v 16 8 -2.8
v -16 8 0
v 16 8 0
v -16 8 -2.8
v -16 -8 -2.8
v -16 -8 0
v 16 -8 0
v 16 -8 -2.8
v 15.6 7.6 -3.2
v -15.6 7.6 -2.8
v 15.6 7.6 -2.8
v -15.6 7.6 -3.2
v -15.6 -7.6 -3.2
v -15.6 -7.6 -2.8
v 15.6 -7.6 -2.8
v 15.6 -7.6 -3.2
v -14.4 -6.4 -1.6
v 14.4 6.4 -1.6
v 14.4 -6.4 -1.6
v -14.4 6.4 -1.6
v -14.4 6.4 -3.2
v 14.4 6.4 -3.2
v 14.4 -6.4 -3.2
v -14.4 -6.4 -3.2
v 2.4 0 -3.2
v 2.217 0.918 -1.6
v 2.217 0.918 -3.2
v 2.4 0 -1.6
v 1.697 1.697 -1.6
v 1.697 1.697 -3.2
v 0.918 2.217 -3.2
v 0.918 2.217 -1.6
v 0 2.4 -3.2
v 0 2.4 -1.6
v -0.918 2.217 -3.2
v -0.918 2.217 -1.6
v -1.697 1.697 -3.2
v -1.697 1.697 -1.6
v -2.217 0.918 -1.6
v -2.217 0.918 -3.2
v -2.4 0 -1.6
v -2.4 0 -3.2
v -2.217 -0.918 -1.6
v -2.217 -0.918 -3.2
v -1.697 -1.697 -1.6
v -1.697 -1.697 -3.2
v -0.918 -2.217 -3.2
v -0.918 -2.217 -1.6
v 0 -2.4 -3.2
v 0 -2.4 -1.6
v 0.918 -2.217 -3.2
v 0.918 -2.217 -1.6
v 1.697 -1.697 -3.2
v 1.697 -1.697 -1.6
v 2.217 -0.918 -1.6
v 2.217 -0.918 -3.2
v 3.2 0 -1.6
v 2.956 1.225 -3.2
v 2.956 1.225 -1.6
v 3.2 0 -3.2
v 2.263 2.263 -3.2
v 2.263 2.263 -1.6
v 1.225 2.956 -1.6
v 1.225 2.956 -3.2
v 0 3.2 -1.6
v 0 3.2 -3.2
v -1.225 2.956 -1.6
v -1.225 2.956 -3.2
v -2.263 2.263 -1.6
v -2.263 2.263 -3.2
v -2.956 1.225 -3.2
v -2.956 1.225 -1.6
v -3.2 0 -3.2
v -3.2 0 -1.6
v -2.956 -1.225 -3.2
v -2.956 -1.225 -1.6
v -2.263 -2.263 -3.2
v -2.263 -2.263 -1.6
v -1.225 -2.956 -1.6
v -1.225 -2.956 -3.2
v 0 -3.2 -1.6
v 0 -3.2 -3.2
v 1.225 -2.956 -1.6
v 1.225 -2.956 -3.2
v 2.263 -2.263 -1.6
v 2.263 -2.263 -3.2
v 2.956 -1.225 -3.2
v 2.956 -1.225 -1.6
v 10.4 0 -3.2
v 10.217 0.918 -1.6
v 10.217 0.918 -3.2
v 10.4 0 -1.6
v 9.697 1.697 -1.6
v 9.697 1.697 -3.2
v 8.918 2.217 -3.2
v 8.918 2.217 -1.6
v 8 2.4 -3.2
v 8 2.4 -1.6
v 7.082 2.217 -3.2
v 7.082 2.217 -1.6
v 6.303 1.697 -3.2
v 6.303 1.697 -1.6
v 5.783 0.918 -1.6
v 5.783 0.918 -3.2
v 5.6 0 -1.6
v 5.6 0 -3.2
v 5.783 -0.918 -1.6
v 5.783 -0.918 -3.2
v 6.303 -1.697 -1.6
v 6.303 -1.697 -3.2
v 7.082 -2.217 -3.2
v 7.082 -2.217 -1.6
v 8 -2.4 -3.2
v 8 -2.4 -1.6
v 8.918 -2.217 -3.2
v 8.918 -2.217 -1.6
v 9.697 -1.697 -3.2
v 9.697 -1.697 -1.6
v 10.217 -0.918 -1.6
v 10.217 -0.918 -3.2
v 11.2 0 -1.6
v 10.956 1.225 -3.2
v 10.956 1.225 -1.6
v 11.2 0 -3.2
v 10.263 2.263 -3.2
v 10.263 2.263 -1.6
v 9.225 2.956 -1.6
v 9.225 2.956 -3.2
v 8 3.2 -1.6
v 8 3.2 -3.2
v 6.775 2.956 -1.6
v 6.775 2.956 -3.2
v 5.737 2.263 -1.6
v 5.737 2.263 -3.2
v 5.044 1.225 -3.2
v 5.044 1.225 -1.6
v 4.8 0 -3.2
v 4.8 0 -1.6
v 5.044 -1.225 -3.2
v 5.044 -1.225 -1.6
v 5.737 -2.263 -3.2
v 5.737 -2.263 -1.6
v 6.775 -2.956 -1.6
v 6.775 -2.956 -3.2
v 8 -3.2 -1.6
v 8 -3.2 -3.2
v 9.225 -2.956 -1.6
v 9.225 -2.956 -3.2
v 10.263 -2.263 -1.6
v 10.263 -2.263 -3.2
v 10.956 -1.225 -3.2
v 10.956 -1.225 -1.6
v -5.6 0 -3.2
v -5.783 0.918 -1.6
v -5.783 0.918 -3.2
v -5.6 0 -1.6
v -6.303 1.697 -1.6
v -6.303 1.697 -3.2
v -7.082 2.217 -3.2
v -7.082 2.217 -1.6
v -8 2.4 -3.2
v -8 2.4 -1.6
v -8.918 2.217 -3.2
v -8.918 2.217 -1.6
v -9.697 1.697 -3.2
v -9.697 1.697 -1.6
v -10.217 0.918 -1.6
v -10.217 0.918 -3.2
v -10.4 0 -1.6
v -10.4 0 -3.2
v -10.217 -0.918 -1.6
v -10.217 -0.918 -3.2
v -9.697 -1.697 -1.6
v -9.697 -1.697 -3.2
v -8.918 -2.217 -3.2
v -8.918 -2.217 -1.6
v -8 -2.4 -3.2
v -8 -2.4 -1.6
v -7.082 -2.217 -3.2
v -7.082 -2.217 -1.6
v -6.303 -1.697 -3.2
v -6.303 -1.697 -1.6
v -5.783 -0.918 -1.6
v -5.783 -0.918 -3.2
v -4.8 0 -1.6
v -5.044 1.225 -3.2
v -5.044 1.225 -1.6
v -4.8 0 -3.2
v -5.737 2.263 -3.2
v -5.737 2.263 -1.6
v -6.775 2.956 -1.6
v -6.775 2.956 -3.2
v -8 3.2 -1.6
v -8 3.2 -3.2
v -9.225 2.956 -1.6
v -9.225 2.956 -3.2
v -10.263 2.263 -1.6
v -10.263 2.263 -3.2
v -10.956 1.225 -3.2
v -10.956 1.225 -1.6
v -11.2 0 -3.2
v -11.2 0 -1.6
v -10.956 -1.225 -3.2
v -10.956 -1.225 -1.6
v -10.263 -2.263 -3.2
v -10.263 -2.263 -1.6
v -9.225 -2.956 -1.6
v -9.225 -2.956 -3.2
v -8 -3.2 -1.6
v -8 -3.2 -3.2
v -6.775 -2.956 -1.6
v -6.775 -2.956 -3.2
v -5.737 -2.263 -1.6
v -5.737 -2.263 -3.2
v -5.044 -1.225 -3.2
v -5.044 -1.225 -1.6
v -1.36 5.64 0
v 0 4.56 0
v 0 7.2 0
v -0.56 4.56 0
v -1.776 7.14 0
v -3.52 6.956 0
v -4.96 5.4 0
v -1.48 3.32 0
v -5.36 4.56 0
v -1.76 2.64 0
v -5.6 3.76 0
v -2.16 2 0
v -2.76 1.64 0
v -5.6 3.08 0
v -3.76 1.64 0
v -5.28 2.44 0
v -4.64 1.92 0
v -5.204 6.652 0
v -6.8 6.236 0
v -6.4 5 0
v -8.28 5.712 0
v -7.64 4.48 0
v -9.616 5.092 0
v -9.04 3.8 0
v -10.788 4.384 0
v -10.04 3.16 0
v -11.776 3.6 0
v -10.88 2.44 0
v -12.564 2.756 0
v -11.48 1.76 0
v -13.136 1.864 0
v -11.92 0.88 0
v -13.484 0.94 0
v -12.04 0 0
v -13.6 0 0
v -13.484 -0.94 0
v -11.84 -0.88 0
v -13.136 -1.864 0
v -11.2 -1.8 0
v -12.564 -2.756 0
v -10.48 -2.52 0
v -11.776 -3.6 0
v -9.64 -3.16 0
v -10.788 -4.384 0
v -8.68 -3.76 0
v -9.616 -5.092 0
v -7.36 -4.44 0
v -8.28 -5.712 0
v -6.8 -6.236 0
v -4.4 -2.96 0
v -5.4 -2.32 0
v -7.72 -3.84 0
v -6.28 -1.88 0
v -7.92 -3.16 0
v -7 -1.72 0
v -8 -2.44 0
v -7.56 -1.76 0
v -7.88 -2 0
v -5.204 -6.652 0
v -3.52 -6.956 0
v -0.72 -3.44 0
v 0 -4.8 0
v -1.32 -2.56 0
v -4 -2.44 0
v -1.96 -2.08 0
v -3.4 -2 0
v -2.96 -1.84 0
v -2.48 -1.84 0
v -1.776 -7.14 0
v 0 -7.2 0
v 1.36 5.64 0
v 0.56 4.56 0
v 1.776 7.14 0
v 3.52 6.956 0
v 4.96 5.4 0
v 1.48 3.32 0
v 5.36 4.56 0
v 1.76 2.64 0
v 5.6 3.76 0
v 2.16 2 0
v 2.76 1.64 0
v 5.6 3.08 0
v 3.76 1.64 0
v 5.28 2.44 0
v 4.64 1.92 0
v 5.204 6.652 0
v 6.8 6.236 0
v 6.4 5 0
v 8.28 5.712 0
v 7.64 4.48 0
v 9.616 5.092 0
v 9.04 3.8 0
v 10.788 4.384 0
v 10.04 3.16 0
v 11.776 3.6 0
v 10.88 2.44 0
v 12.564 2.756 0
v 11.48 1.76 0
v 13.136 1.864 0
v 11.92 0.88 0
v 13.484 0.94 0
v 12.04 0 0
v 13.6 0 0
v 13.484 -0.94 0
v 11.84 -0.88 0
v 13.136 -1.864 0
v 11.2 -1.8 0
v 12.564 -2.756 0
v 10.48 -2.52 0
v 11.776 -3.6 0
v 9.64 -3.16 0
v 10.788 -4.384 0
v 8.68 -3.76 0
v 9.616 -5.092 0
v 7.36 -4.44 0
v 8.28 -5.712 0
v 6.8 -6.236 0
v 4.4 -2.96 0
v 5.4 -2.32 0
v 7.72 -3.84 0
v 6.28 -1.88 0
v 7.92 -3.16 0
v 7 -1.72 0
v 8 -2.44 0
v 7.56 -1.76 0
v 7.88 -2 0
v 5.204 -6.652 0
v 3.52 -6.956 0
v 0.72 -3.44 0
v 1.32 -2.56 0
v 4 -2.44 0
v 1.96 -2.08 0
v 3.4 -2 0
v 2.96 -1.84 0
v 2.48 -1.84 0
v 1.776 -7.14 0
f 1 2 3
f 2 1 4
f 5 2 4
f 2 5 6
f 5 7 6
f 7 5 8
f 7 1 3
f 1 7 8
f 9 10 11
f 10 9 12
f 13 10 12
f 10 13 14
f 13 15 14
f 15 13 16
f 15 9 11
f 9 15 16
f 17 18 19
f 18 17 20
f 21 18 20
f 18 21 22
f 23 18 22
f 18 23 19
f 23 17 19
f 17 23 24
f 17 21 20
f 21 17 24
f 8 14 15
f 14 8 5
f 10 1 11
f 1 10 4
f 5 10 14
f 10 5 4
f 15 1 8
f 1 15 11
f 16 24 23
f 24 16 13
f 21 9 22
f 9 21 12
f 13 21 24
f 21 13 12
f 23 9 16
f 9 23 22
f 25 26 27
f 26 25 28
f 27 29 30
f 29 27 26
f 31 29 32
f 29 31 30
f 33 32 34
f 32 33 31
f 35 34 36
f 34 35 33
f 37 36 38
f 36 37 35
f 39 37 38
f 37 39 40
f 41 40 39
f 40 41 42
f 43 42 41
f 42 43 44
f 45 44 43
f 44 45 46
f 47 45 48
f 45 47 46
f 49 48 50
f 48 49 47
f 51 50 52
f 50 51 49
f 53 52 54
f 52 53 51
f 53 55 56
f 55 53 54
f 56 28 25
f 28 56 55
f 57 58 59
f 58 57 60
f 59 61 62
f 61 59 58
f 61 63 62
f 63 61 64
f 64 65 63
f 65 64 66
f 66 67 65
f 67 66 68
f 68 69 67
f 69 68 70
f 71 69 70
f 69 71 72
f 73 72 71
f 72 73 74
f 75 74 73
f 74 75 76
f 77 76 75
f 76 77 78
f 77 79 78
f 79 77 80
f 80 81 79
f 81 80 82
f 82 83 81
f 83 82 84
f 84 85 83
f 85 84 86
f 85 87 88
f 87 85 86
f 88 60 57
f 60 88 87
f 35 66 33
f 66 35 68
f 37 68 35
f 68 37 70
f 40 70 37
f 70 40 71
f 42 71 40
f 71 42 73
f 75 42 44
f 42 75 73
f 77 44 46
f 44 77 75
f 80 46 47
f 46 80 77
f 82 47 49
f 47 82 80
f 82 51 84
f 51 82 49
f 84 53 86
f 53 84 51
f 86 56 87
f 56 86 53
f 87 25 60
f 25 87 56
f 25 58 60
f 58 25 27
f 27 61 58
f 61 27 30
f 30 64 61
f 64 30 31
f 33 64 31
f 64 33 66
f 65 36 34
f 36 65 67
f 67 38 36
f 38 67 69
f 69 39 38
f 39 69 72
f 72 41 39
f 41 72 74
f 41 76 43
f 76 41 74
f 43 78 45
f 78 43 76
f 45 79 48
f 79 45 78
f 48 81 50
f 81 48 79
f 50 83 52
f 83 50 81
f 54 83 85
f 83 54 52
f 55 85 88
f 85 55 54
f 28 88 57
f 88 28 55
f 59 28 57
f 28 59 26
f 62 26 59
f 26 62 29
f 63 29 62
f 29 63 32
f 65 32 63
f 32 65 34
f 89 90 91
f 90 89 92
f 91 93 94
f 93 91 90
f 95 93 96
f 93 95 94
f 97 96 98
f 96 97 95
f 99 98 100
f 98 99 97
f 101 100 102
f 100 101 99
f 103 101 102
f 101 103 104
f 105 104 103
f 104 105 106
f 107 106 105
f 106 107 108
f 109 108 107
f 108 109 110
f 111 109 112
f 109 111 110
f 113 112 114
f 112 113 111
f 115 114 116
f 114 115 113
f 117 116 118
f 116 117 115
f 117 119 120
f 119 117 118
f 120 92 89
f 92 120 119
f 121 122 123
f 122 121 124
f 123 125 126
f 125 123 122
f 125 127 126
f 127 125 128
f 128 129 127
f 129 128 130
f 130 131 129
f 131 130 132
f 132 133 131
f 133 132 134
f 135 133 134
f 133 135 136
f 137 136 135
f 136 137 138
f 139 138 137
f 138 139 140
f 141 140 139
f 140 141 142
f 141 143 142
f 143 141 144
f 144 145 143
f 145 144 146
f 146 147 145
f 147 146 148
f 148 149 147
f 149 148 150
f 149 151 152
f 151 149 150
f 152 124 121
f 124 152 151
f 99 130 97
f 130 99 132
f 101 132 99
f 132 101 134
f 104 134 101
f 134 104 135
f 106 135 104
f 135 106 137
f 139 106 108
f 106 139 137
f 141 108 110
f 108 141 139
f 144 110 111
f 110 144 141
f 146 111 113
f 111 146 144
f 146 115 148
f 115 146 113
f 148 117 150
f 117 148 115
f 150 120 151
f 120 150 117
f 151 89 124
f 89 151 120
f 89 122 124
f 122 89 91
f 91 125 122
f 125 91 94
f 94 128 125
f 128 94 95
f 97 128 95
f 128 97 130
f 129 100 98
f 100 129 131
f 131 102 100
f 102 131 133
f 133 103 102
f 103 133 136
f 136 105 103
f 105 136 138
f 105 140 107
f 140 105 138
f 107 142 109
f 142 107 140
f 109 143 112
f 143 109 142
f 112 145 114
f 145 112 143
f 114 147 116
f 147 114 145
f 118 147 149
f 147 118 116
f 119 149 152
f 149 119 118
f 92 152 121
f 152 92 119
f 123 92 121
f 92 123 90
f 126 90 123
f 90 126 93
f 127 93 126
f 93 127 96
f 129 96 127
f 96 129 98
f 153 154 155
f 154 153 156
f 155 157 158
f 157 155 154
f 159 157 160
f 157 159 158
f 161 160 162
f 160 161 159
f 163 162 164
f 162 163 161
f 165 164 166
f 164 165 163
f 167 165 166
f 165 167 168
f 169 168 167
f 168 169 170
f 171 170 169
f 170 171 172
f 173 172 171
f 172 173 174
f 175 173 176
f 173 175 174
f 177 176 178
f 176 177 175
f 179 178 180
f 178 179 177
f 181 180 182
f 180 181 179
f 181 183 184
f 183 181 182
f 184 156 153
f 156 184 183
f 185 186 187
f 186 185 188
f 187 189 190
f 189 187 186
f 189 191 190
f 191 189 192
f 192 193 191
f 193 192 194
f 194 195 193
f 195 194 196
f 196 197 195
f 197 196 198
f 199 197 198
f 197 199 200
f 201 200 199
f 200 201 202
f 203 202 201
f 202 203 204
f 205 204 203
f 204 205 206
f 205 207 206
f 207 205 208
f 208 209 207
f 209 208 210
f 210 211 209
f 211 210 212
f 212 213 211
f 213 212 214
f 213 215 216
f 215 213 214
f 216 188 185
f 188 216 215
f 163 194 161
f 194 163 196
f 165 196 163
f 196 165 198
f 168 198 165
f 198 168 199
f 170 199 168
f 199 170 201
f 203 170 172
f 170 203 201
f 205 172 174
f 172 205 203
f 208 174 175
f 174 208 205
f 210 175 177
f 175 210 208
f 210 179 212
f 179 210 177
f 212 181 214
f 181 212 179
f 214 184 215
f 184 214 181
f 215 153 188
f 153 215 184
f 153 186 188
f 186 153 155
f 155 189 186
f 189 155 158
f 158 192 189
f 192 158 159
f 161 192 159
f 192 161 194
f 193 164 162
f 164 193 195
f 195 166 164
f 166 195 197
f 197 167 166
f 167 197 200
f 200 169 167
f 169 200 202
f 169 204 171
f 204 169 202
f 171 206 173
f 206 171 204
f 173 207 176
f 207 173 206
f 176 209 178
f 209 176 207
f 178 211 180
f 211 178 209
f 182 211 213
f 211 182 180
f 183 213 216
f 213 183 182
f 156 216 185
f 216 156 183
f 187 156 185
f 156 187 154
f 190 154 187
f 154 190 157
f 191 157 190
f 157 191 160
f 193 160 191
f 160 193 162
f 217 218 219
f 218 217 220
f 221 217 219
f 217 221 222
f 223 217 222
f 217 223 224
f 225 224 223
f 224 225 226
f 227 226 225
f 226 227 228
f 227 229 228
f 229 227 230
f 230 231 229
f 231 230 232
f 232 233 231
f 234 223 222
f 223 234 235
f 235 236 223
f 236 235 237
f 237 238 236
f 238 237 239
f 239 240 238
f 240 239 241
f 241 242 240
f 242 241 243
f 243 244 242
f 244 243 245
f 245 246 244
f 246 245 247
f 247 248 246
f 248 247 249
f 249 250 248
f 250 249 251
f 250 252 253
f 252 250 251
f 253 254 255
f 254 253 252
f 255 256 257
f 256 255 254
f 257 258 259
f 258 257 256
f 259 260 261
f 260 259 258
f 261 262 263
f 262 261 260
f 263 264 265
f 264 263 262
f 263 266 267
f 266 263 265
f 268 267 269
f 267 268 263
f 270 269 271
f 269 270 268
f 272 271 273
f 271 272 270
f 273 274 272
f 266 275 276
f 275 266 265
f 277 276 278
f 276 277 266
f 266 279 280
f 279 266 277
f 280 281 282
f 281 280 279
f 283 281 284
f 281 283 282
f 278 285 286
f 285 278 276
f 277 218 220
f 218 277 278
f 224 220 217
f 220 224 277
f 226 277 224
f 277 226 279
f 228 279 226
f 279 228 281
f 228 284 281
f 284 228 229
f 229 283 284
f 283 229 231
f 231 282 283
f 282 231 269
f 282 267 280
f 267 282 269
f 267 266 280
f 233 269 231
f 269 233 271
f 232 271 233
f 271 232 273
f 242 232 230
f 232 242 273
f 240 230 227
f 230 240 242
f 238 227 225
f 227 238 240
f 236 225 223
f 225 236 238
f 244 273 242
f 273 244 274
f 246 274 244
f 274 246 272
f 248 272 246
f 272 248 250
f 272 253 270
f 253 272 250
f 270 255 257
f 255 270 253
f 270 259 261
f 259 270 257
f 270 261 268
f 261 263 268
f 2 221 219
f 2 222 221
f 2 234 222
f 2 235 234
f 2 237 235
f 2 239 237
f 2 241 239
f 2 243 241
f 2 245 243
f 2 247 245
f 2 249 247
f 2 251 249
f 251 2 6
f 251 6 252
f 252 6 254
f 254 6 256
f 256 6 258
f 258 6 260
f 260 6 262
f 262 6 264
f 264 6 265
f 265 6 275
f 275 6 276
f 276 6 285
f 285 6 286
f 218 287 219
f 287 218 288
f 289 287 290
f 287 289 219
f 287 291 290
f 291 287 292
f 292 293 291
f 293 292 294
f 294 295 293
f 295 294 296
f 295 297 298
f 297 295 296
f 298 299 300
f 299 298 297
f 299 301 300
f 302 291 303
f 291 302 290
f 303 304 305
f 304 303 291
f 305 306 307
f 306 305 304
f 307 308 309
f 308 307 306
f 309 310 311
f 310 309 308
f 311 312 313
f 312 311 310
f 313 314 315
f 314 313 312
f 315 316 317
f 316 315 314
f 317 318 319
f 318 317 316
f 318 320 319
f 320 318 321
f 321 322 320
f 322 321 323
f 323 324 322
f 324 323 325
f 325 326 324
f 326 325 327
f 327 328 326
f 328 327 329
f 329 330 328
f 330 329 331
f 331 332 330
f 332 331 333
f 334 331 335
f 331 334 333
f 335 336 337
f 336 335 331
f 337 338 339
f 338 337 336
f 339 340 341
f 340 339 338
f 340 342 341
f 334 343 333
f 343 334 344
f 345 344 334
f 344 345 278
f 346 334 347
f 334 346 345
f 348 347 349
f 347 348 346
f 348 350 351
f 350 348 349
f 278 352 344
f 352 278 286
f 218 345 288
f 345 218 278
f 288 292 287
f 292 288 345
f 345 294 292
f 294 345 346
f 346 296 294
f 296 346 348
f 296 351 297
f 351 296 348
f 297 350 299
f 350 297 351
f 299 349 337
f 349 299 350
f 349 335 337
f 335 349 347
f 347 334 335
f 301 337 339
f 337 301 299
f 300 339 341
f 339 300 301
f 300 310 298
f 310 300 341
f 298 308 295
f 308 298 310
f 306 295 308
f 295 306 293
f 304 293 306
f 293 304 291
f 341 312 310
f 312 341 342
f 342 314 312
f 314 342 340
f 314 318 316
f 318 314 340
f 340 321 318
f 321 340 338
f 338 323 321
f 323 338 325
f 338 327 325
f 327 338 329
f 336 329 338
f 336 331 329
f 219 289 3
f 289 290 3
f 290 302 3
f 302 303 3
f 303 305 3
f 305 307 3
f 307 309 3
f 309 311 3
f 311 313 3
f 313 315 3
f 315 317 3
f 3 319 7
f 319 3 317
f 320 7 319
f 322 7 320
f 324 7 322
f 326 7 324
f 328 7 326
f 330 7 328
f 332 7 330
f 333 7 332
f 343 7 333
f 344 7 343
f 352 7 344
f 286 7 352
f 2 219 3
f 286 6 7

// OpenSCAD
// file: ../p/4-4ring3.scad
use <../lib.scad>
$fa=1; $fs=0.2;
function ldraw_lib__4_4ring3(realsolid=false) = [
// 0 Ring  3 x 1.0
// 0 Name: 4-4ring3.dat
// 0 Author: James Jessiman
// 0 !LDRAW_ORG Primitive UPDATE 2009-01
// 0 !LICENSE Licensed under CC BY 2.0 and CC BY 4.0 : see CAreadme.txt
// 
// 0 BFC CERTIFY CCW
  [0,"BFC","CERTIFY"],
  [0,"BFC","CCW"],
// 
// 0 !HISTORY 1998-12-15 [PTadmin] Official Update 1998-10
// 0 !HISTORY 2002-04-05 [hafhead] Added BFC statement
// 0 !HISTORY 2002-04-25 [PTadmin] Official Update 2002-02
// 0 !HISTORY 2007-06-24 [PTadmin] Header formatted for Contributor Agreement
// 0 !HISTORY 2008-07-01 [PTadmin] Official Update 2008-01
// 0 !HISTORY 2008-08-26 [cwdee] Switch polygon winding and rename
// 0 !HISTORY 2009-05-02 [PTadmin] Official Update 2009-01
// 
// 
// 4 16 -1.5308 0 3.6956 -1.1481 0 2.7717 0 0 3 0 0 4
  [4,16,-1.5308,0,3.6956,-1.1481,0,2.7717,0,0,3,0,0,4],
// 4 16 -2.8284 0 2.8284 -2.1213 0 2.1213 -1.1481 0 2.7717 -1.5308 0 3.6956
  [4,16,-2.8284,0,2.8284,-2.1213,0,2.1213,-1.1481,0,2.7717,-1.5308,0,3.6956],
// 4 16 -3.6956 0 1.5308 -2.7717 0 1.1481 -2.1213 0 2.1213 -2.8284 0 2.8284
  [4,16,-3.6956,0,1.5308,-2.7717,0,1.1481,-2.1213,0,2.1213,-2.8284,0,2.8284],
// 4 16 -4 0 0 -3 0 0 -2.7717 0 1.1481 -3.6956 0 1.5308
  [4,16,-4,0,0,-3,0,0,-2.7717,0,1.1481,-3.6956,0,1.5308],
// 4 16 -3.6956 0 -1.5308 -2.7717 0 -1.1481 -3 0 0 -4 0 0
  [4,16,-3.6956,0,-1.5308,-2.7717,0,-1.1481,-3,0,0,-4,0,0],
// 4 16 -2.8284 0 -2.8284 -2.1213 0 -2.1213 -2.7717 0 -1.1481 -3.6956 0 -1.5308
  [4,16,-2.8284,0,-2.8284,-2.1213,0,-2.1213,-2.7717,0,-1.1481,-3.6956,0,-1.5308],
// 4 16 -1.5308 0 -3.6956 -1.1481 0 -2.7717 -2.1213 0 -2.1213 -2.8284 0 -2.8284
  [4,16,-1.5308,0,-3.6956,-1.1481,0,-2.7717,-2.1213,0,-2.1213,-2.8284,0,-2.8284],
// 4 16 0 0 -4 0 0 -3 -1.1481 0 -2.7717 -1.5308 0 -3.6956
  [4,16,0,0,-4,0,0,-3,-1.1481,0,-2.7717,-1.5308,0,-3.6956],
// 4 16 1.5308 0 -3.6956 1.1481 0 -2.7717 0 0 -3 0 0 -4
  [4,16,1.5308,0,-3.6956,1.1481,0,-2.7717,0,0,-3,0,0,-4],
// 4 16 2.8284 0 -2.8284 2.1213 0 -2.1213 1.1481 0 -2.7717 1.5308 0 -3.6956
  [4,16,2.8284,0,-2.8284,2.1213,0,-2.1213,1.1481,0,-2.7717,1.5308,0,-3.6956],
// 4 16 3.6956 0 -1.5308 2.7717 0 -1.1481 2.1213 0 -2.1213 2.8284 0 -2.8284
  [4,16,3.6956,0,-1.5308,2.7717,0,-1.1481,2.1213,0,-2.1213,2.8284,0,-2.8284],
// 4 16 4 0 0 3 0 0 2.7717 0 -1.1481 3.6956 0 -1.5308
  [4,16,4,0,0,3,0,0,2.7717,0,-1.1481,3.6956,0,-1.5308],
// 4 16 3.6956 0 1.5308 2.7717 0 1.1481 3 0 0 4 0 0
  [4,16,3.6956,0,1.5308,2.7717,0,1.1481,3,0,0,4,0,0],
// 4 16 2.8284 0 2.8284 2.1213 0 2.1213 2.7717 0 1.1481 3.6956 0 1.5308
  [4,16,2.8284,0,2.8284,2.1213,0,2.1213,2.7717,0,1.1481,3.6956,0,1.5308],
// 4 16 1.5308 0 3.6956 1.1481 0 2.7717 2.1213 0 2.1213 2.8284 0 2.8284
  [4,16,1.5308,0,3.6956,1.1481,0,2.7717,2.1213,0,2.1213,2.8284,0,2.8284],
// 4 16 0 0 4 0 0 3 1.1481 0 2.7717 1.5308 0 3.6956
  [4,16,0,0,4,0,0,3,1.1481,0,2.7717,1.5308,0,3.6956],
// 0
];
module ldraw_lib__4_4ring3(step=0, col=false, unit=2/5, alt=false, line=0.2, solid=!$preview)
    makepoly(ldraw_lib__4_4ring3(solid), step=step, col=col, unit=unit, alt=alt, line=line, solid=solid);
ldraw_lib__4_4ring3(line=0.2);
// file: ../p/4-4edge.scad
use <../lib.scad>
function ldraw_lib__4_4edge() = [
// 0 Circle 1.0
// 0 Name: 4-4edge.dat
// 0 Author: James Jessiman
// 0 !LDRAW_ORG Primitive UPDATE 2017-01
// 0 !LICENSE Licensed under CC BY 2.0 and CC BY 4.0 : see CAreadme.txt
// 
// 0 BFC CERTIFY CCW
  [0,"BFC","CERTIFY"],
  [0,"BFC","CCW"],
// 
// 0 !HISTORY 1998-12-15 [PTadmin] Official Update 1998-10
// 0 !HISTORY 2005-12-28 [PTadmin] Official Update 2005-01
// 0 !HISTORY 2007-06-24 [PTadmin] Header formatted for Contributor Agreement
// 0 !HISTORY 2008-07-01 [PTadmin] Official Update 2008-01
// 0 !HISTORY 2017-01-15 [Steffen] BFCed
// 0 !HISTORY 2017-12-30 [PTadmin] Official Update 2017-01
// 
// 
// 2 24 1 0 0 0.9239 0 0.3827
  [2,24,1,0,0,0.9239,0,0.3827],
// 2 24 0.9239 0 0.3827 0.7071 0 0.7071
  [2,24,0.9239,0,0.3827,0.7071,0,0.7071],
// 2 24 0.7071 0 0.7071 0.3827 0 0.9239
  [2,24,0.7071,0,0.7071,0.3827,0,0.9239],
// 2 24 0.3827 0 0.9239 0 0 1
  [2,24,0.3827,0,0.9239,0,0,1],
// 2 24 0 0 1 -0.3827 0 0.9239
  [2,24,0,0,1,-0.3827,0,0.9239],
// 2 24 -0.3827 0 0.9239 -0.7071 0 0.7071
  [2,24,-0.3827,0,0.9239,-0.7071,0,0.7071],
// 2 24 -0.7071 0 0.7071 -0.9239 0 0.3827
  [2,24,-0.7071,0,0.7071,-0.9239,0,0.3827],
// 2 24 -0.9239 0 0.3827 -1 0 -0
  [2,24,-0.9239,0,0.3827,-1,0,-0],
// 2 24 -1 0 -0 -0.9239 0 -0.3827
  [2,24,-1,0,-0,-0.9239,0,-0.3827],
// 2 24 -0.9239 0 -0.3827 -0.7071 0 -0.7071
  [2,24,-0.9239,0,-0.3827,-0.7071,0,-0.7071],
// 2 24 -0.7071 0 -0.7071 -0.3827 0 -0.9239
  [2,24,-0.7071,0,-0.7071,-0.3827,0,-0.9239],
// 2 24 -0.3827 0 -0.9239 0 0 -1
  [2,24,-0.3827,0,-0.9239,0,0,-1],
// 2 24 0 0 -1 0.3827 0 -0.9239
  [2,24,0,0,-1,0.3827,0,-0.9239],
// 2 24 0.3827 0 -0.9239 0.7071 0 -0.7071
  [2,24,0.3827,0,-0.9239,0.7071,0,-0.7071],
// 2 24 0.7071 0 -0.7071 0.9239 0 -0.3827
  [2,24,0.7071,0,-0.7071,0.9239,0,-0.3827],
// 2 24 0.9239 0 -0.3827 1 0 0
  [2,24,0.9239,0,-0.3827,1,0,0],
];
module ldraw_lib__4_4edge(step=0, col=false, unit=2/5, alt=false, line=0.2, solid=!$preview)
    makepoly(ldraw_lib__4_4edge(), step=step, col=col, unit=unit, alt=alt, line=line, solid=solid);
ldraw_lib__4_4edge(line=0.2);
// file: ../p/4-4cyli.scad
use <../lib.scad>
$fa=1; $fs=0.2;
function ldraw_lib__4_4cyli(realsolid=false) = [
// 0 Cylinder 1.0
// 0 Name: 4-4cyli.dat
// 0 Author: James Jessiman
// 0 !LDRAW_ORG Primitive UPDATE 2005-01
// 0 !LICENSE Licensed under CC BY 2.0 and CC BY 4.0 : see CAreadme.txt
// 
// 0 BFC CERTIFY CCW
  [0,"BFC","CERTIFY"],
  [0,"BFC","CCW"],
// 
// 0 !HISTORY 1998-12-15 [PTadmin] Official Update 1998-10
// 0 !HISTORY 2002-03-23 [sbliss] Added BFC statement; merged headers from files in distributions LDraw 0.27 and Complete.
// 0 !HISTORY 2002-04-25 [PTadmin] Official Update 2002-02
// 0 !HISTORY 2004-12-14 [guyvivan] BFC CCW
// 0 !HISTORY 2005-12-28 [PTadmin] Official Update 2005-01
// 0 !HISTORY 2007-06-24 [PTadmin] Header formatted for Contributor Agreement
// 0 !HISTORY 2008-07-01 [PTadmin] Official Update 2008-01
// 
// 
// 4 16 1 1 0 0.9239 1 0.3827 0.9239 0 0.3827 1 0 0
  [4,16,1,1,0,0.9239,1,0.3827,0.9239,0,0.3827,1,0,0],
// 5 24 1 0 0 1 1 0 0.9239 0 0.3827 0.9239 0 -0.3827
  [5,24,1,0,0,1,1,0,0.9239,0,0.3827,0.9239,0,-0.3827],
// 4 16 0.9239 1 0.3827 0.7071 1 0.7071 0.7071 0 0.7071 0.9239 0 0.3827
  [4,16,0.9239,1,0.3827,0.7071,1,0.7071,0.7071,0,0.7071,0.9239,0,0.3827],
// 5 24 0.9239 0 0.3827 0.9239 1 0.3827 0.7071 0 0.7071 1 0 0
  [5,24,0.9239,0,0.3827,0.9239,1,0.3827,0.7071,0,0.7071,1,0,0],
// 4 16 0.7071 1 0.7071 0.3827 1 0.9239 0.3827 0 0.9239 0.7071 0 0.7071
  [4,16,0.7071,1,0.7071,0.3827,1,0.9239,0.3827,0,0.9239,0.7071,0,0.7071],
// 5 24 0.7071 0 0.7071 0.7071 1 0.7071 0.3827 0 0.9239 0.9239 0 0.3827
  [5,24,0.7071,0,0.7071,0.7071,1,0.7071,0.3827,0,0.9239,0.9239,0,0.3827],
// 4 16 0.3827 1 0.9239 0 1 1 0 0 1 0.3827 0 0.9239
  [4,16,0.3827,1,0.9239,0,1,1,0,0,1,0.3827,0,0.9239],
// 5 24 0.3827 0 0.9239 0.3827 1 0.9239 0 0 1 0.7071 0 0.7071
  [5,24,0.3827,0,0.9239,0.3827,1,0.9239,0,0,1,0.7071,0,0.7071],
// 4 16 0 1 1 -0.3827 1 0.9239 -0.3827 0 0.9239 0 0 1
  [4,16,0,1,1,-0.3827,1,0.9239,-0.3827,0,0.9239,0,0,1],
// 5 24 0 0 1 0 1 1 -0.3827 0 0.9239 0.3827 0 0.9239
  [5,24,0,0,1,0,1,1,-0.3827,0,0.9239,0.3827,0,0.9239],
// 4 16 -0.3827 1 0.9239 -0.7071 1 0.7071 -0.7071 0 0.7071 -0.3827 0 0.9239
  [4,16,-0.3827,1,0.9239,-0.7071,1,0.7071,-0.7071,0,0.7071,-0.3827,0,0.9239],
// 5 24 -0.3827 0 0.9239 -0.3827 1 0.9239 -0.7071 0 0.7071 0 0 1
  [5,24,-0.3827,0,0.9239,-0.3827,1,0.9239,-0.7071,0,0.7071,0,0,1],
// 4 16 -0.7071 1 0.7071 -0.9239 1 0.3827 -0.9239 0 0.3827 -0.7071 0 0.7071
  [4,16,-0.7071,1,0.7071,-0.9239,1,0.3827,-0.9239,0,0.3827,-0.7071,0,0.7071],
// 5 24 -0.7071 0 0.7071 -0.7071 1 0.7071 -0.9239 0 0.3827 -0.3827 0 0.9239
  [5,24,-0.7071,0,0.7071,-0.7071,1,0.7071,-0.9239,0,0.3827,-0.3827,0,0.9239],
// 4 16 -0.9239 1 0.3827 -1 1 0 -1 0 0 -0.9239 0 0.3827
  [4,16,-0.9239,1,0.3827,-1,1,0,-1,0,0,-0.9239,0,0.3827],
// 5 24 -0.9239 0 0.3827 -0.9239 1 0.3827 -1 0 0 -0.7071 0 0.7071
  [5,24,-0.9239,0,0.3827,-0.9239,1,0.3827,-1,0,0,-0.7071,0,0.7071],
// 4 16 -1 1 0 -0.9239 1 -0.3827 -0.9239 0 -0.3827 -1 0 0
  [4,16,-1,1,0,-0.9239,1,-0.3827,-0.9239,0,-0.3827,-1,0,0],
// 5 24 -1 0 0 -1 1 0 -0.9239 0 -0.3827 -0.9239 0 0.3827
  [5,24,-1,0,0,-1,1,0,-0.9239,0,-0.3827,-0.9239,0,0.3827],
// 4 16 -0.9239 1 -0.3827 -0.7071 1 -0.7071 -0.7071 0 -0.7071 -0.9239 0 -0.3827
  [4,16,-0.9239,1,-0.3827,-0.7071,1,-0.7071,-0.7071,0,-0.7071,-0.9239,0,-0.3827],
// 5 24 -0.9239 0 -0.3827 -0.9239 1 -0.3827 -0.7071 0 -0.7071 -1 0 0
  [5,24,-0.9239,0,-0.3827,-0.9239,1,-0.3827,-0.7071,0,-0.7071,-1,0,0],
// 4 16 -0.7071 1 -0.7071 -0.3827 1 -0.9239 -0.3827 0 -0.9239 -0.7071 0 -0.7071
  [4,16,-0.7071,1,-0.7071,-0.3827,1,-0.9239,-0.3827,0,-0.9239,-0.7071,0,-0.7071],
// 5 24 -0.7071 0 -0.7071 -0.7071 1 -0.7071 -0.3827 0 -0.9239 -0.9239 0 -0.3827
  [5,24,-0.7071,0,-0.7071,-0.7071,1,-0.7071,-0.3827,0,-0.9239,-0.9239,0,-0.3827],
// 4 16 -0.3827 1 -0.9239 0 1 -1 0 0 -1 -0.3827 0 -0.9239
  [4,16,-0.3827,1,-0.9239,0,1,-1,0,0,-1,-0.3827,0,-0.9239],
// 5 24 -0.3827 0 -0.9239 -0.3827 1 -0.9239 0 0 -1 -0.7071 0 -0.7071
  [5,24,-0.3827,0,-0.9239,-0.3827,1,-0.9239,0,0,-1,-0.7071,0,-0.7071],
// 4 16 0 1 -1 0.3827 1 -0.9239 0.3827 0 -0.9239 0 0 -1
  [4,16,0,1,-1,0.3827,1,-0.9239,0.3827,0,-0.9239,0,0,-1],
// 5 24 0 0 -1 0 1 -1 0.3827 0 -0.9239 -0.3827 0 -0.9239
  [5,24,0,0,-1,0,1,-1,0.3827,0,-0.9239,-0.3827,0,-0.9239],
// 4 16 0.3827 1 -0.9239 0.7071 1 -0.7071 0.7071 0 -0.7071 0.3827 0 -0.9239
  [4,16,0.3827,1,-0.9239,0.7071,1,-0.7071,0.7071,0,-0.7071,0.3827,0,-0.9239],
// 5 24 0.3827 0 -0.9239 0.3827 1 -0.9239 0.7071 0 -0.7071 0 0 -1
  [5,24,0.3827,0,-0.9239,0.3827,1,-0.9239,0.7071,0,-0.7071,0,0,-1],
// 4 16 0.7071 1 -0.7071 0.9239 1 -0.3827 0.9239 0 -0.3827 0.7071 0 -0.7071
  [4,16,0.7071,1,-0.7071,0.9239,1,-0.3827,0.9239,0,-0.3827,0.7071,0,-0.7071],
// 5 24 0.7071 0 -0.7071 0.7071 1 -0.7071 0.9239 0 -0.3827 0.3827 0 -0.9239
  [5,24,0.7071,0,-0.7071,0.7071,1,-0.7071,0.9239,0,-0.3827,0.3827,0,-0.9239],
// 4 16 0.9239 1 -0.3827 1 1 0 1 0 0 0.9239 0 -0.3827
  [4,16,0.9239,1,-0.3827,1,1,0,1,0,0,0.9239,0,-0.3827],
// 5 24 0.9239 0 -0.3827 0.9239 1 -0.3827 1 0 0 0.7071 0 -0.7071
  [5,24,0.9239,0,-0.3827,0.9239,1,-0.3827,1,0,0,0.7071,0,-0.7071],
// 0
];
module ldraw_lib__4_4cyli(step=0, col=false, unit=2/5, alt=false, line=0.2, solid=!$preview)
    makepoly(ldraw_lib__4_4cyli(solid), step=step, col=col, unit=unit, alt=alt, line=line, solid=solid);
ldraw_lib__4_4cyli(line=0.2);
// file: ../p/stud4.scad
use <../lib.scad>
use <4-4cyli.scad>
use <4-4edge.scad>
use <4-4ring3.scad>
function ldraw_lib__stud4() = [
// 0 Stud Tube Open
// 0 Name: stud4.dat
// 0 Author: James Jessiman
// 0 !LDRAW_ORG Primitive UPDATE 2009-02
// 0 !LICENSE Licensed under CC BY 4.0 : see CAreadme.txt
// 
// 0 BFC CERTIFY CCW
  [0,"BFC","CERTIFY"],
  [0,"BFC","CCW"],
// 
// 0 !HISTORY 1999-07-05 [PTadmin] Official Update 1999-05
// 0 !HISTORY 2002-04-04 [sbliss] Modified for BFC compliance
// 0 !HISTORY 2002-04-25 [PTadmin] Official Update 2002-02
// 0 !HISTORY 2007-06-24 [PTadmin] Header formatted for Contributor Agreement
// 0 !HISTORY 2008-07-01 [PTadmin] Official Update 2008-01
// 0 !HISTORY 2009-06-21 [cwdee] Update ring references to 4-4ring
// 0 !HISTORY 2009-09-03 [PTadmin] Official Update 2009-02
// 
// 
// 1 16 0 -4 0 6 0 0 0 1 0 0 0 6 4-4edge.dat
  [1,16,0,-4,0,6,0,0,0,1,0,0,0,6, ldraw_lib__4_4edge()],
// 1 16 0 -4 0 8 0 0 0 1 0 0 0 8 4-4edge.dat
  [1,16,0,-4,0,8,0,0,0,1,0,0,0,8, ldraw_lib__4_4edge()],
// 1 16 0 0 0 6 0 0 0 1 0 0 0 6 4-4edge.dat
  [1,16,0,0,0,6,0,0,0,1,0,0,0,6, ldraw_lib__4_4edge()],
// 1 16 0 0 0 8 0 0 0 1 0 0 0 8 4-4edge.dat
  [1,16,0,0,0,8,0,0,0,1,0,0,0,8, ldraw_lib__4_4edge()],
// 0 BFC INVERTNEXT
  [0,"BFC","INVERTNEXT"],
// 1 16 0 -4 0 6 0 0 0 4 0 0 0 6 4-4cyli.dat
  [1,16,0,-4,0,6,0,0,0,4,0,0,0,6, ldraw_lib__4_4cyli()],
// 1 16 0 -4 0 8 0 0 0 4 0 0 0 8 4-4cyli.dat
  [1,16,0,-4,0,8,0,0,0,4,0,0,0,8, ldraw_lib__4_4cyli()],
// 1 16 0 -4 0 2 0 0 0 1 0 0 0 2 4-4ring3.dat
  [1,16,0,-4,0,2,0,0,0,1,0,0,0,2, ldraw_lib__4_4ring3()],
  [-1,16,0,0,0,2,0,0,0,-1,0,0,0,2, ldraw_lib__4_4ring3()],
// 0
];
module ldraw_lib__stud4(step=0, col=false, unit=2/5, alt=false, line=0.2, solid=!$preview)
    makepoly(ldraw_lib__stud4(), step=step, col=col, unit=unit, alt=alt, line=line, solid=solid);
ldraw_lib__stud4(line=0.2);
// file: ../p/box5.scad
use <../lib.scad>
function ldraw_lib__box5() = [
// 0 Box with 5 Faces and All Edges
// 0 Name: box5.dat
// 0 Author: James Jessiman
// 0 !LDRAW_ORG Primitive UPDATE 2012-01
// 0 !LICENSE Licensed under CC BY 2.0 and CC BY 4.0 : see CAreadme.txt
// 
// 0 BFC CERTIFY CCW
  [0,"BFC","CERTIFY"],
  [0,"BFC","CCW"],
// 
// 0 !HISTORY 2002-04-03 [sbliss] Modified for BFC compliance
// 0 !HISTORY 2002-04-25 [PTadmin] Official Update 2002-02
// 0 !HISTORY 2007-06-24 [PTadmin] Header formatted for Contributor Agreement
// 0 !HISTORY 2008-07-01 [PTadmin] Official Update 2008-01
// 0 !HISTORY 2012-02-16 [Philo] Changed to CCW
// 0 !HISTORY 2012-03-30 [PTadmin] Official Update 2012-01
// 
// 
// 2 24 1 1 1 -1 1 1
  [2,24,1,1,1,-1,1,1],
// 2 24 -1 1 1 -1 1 -1
  [2,24,-1,1,1,-1,1,-1],
// 2 24 -1 1 -1 1 1 -1
  [2,24,-1,1,-1,1,1,-1],
// 2 24 1 1 -1 1 1 1
  [2,24,1,1,-1,1,1,1],
// 2 24 1 0 1 -1 0 1
  [2,24,1,0,1,-1,0,1],
// 2 24 -1 0 1 -1 0 -1
  [2,24,-1,0,1,-1,0,-1],
// 2 24 -1 0 -1 1 0 -1
  [2,24,-1,0,-1,1,0,-1],
// 2 24 1 0 -1 1 0 1
  [2,24,1,0,-1,1,0,1],
// 2 24 1 0 1 1 1 1
  [2,24,1,0,1,1,1,1],
// 2 24 -1 0 1 -1 1 1
  [2,24,-1,0,1,-1,1,1],
// 2 24 1 0 -1 1 1 -1
  [2,24,1,0,-1,1,1,-1],
// 2 24 -1 0 -1 -1 1 -1
  [2,24,-1,0,-1,-1,1,-1],
// 4 16 -1 1 1 1 1 1 1 1 -1 -1 1 -1
  [4,16,-1,1,1,1,1,1,1,1,-1,-1,1,-1],
// 4 16 -1 1 1 -1 0 1 1 0 1 1 1 1
  [4,16,-1,1,1,-1,0,1,1,0,1,1,1,1],
// 4 16 -1 1 -1 -1 0 -1 -1 0 1 -1 1 1
  [4,16,-1,1,-1,-1,0,-1,-1,0,1,-1,1,1],
// 4 16 1 1 -1 1 0 -1 -1 0 -1 -1 1 -1
  [4,16,1,1,-1,1,0,-1,-1,0,-1,-1,1,-1],
// 4 16 1 1 1 1 0 1 1 0 -1 1 1 -1
  [4,16,1,1,1,1,0,1,1,0,-1,1,1,-1],
];
makepoly(ldraw_lib__box5(), line=0.2);
// file: ../p/box4.scad
use <../lib.scad>
function ldraw_lib__box4() = [
// 0 Box with 4 Faces (2 Parallel Pairs) and All Edges
// 0 Name: box4.dat
// 0 Author: James Jessiman
// 0 !LDRAW_ORG Primitive UPDATE 2012-01
// 0 !LICENSE Licensed under CC BY 4.0 : see CAreadme.txt
// 
// 0 BFC CERTIFY CCW
  [0,"BFC","CERTIFY"],
  [0,"BFC","CCW"],
// 
// 0 !HISTORY 2002-04-03 [sbliss] Modified for BFC compliance
// 0 !HISTORY 2002-04-25 [PTadmin] Official Update 2002-02
// 0 !HISTORY 2007-06-24 [PTadmin] Header formatted for Contributor Agreement
// 0 !HISTORY 2008-07-01 [PTadmin] Official Update 2008-01
// 0 !HISTORY 2012-02-16 [Philo] Changed to CCW
// 0 !HISTORY 2012-03-30 [PTadmin] Official Update 2012-01
// 
// 
// 2 24 1 1 1 -1 1 1
  [2,24,1,1,1,-1,1,1],
// 2 24 -1 1 1 -1 1 -1
  [2,24,-1,1,1,-1,1,-1],
// 2 24 -1 1 -1 1 1 -1
  [2,24,-1,1,-1,1,1,-1],
// 2 24 1 1 -1 1 1 1
  [2,24,1,1,-1,1,1,1],
// 2 24 1 0 1 -1 0 1
  [2,24,1,0,1,-1,0,1],
// 2 24 -1 0 1 -1 0 -1
  [2,24,-1,0,1,-1,0,-1],
// 2 24 -1 0 -1 1 0 -1
  [2,24,-1,0,-1,1,0,-1],
// 2 24 1 0 -1 1 0 1
  [2,24,1,0,-1,1,0,1],
// 2 24 1 0 1 1 1 1
  [2,24,1,0,1,1,1,1],
// 2 24 -1 0 1 -1 1 1
  [2,24,-1,0,1,-1,1,1],
// 2 24 1 0 -1 1 1 -1
  [2,24,1,0,-1,1,1,-1],
// 2 24 -1 0 -1 -1 1 -1
  [2,24,-1,0,-1,-1,1,-1],
// 4 16 -1 1 1 -1 0 1 1 0 1 1 1 1
  [4,16,-1,1,1,-1,0,1,1,0,1,1,1,1],
// 4 16 -1 1 -1 -1 0 -1 -1 0 1 -1 1 1
  [4,16,-1,1,-1,-1,0,-1,-1,0,1,-1,1,1],
// 4 16 1 1 -1 1 0 -1 -1 0 -1 -1 1 -1
  [4,16,1,1,-1,1,0,-1,-1,0,-1,-1,1,-1],
// 4 16 1 1 1 1 0 1 1 0 -1 1 1 -1
  [4,16,1,1,1,1,0,1,1,0,-1,1,1,-1],
];
module ldraw_lib__box4(step=0, col=false, unit=2/5, alt=false, line=0.2, solid=!$preview)
    makepoly(ldraw_lib__box4(), step=step, col=col, unit=unit, alt=alt, line=line, solid=solid);
ldraw_lib__box4(line=0.2);
// file: s/87079s01.scad
use <../../lib.scad>
use <../../p/box4.scad>
use <../../p/box5.scad>
use <../../p/stud4.scad>
function ldraw_lib__s__87079s01() = [
// 0 ~Tile  2 x  4 without Top Surface
// 0 Name: s\87079s01.dat
// 0 Author: Philippe Hurbain [Philo]
// 0 !LDRAW_ORG Subpart UPDATE 2025-04
// 0 !LICENSE Licensed under CC BY 4.0 : see CAreadme.txt
// 
// 0 BFC CERTIFY CCW
  [0,"BFC","CERTIFY"],
  [0,"BFC","CCW"],
// 
// 0 !HISTORY 2012-09-30 [Philo] Subparted from Tim Gould's original design
// 0 !HISTORY 2012-12-28 [PTadmin] Official Update 2012-03
// 0 !HISTORY 2025-04-25 [MagFors] Update description
// 0 !HISTORY 2025-04-27 [OrionP] Official Update 2025-04
// 
// 1 16 0 0 0 40 0 0 0 7 0 0 0 20 box4.dat
  [1,16,0,0,0,40,0,0,0,7,0,0,0,20, ldraw_lib__box4()],
// 1 16 0 7 0 39 0 0 0 1 0 0 0 19 box4.dat
  [1,16,0,7,0,39,0,0,0,1,0,0,0,19, ldraw_lib__box4()],
// 0 BFC INVERTNEXT
  [0,"BFC","INVERTNEXT"],
// 1 16 0 8 0 -36 0 0 0 -4 0 0 0 16 box5.dat
  [1,16,0,8,0,-36,0,0,0,-4,0,0,0,16, ldraw_lib__box5()],
// 4 16 -40 7 -20 -39 7 -19 39 7 -19 40 7 -20
  [4,16,-40,7,-20,-39,7,-19,39,7,-19,40,7,-20],
// 4 16 40 7 20 39 7 19 -39 7 19 -40 7 20
  [4,16,40,7,20,39,7,19,-39,7,19,-40,7,20],
// 4 16 -40 7 -20 -40 7 20 -39 7 19 -39 7 -19
  [4,16,-40,7,-20,-40,7,20,-39,7,19,-39,7,-19],
// 4 16 40 7 20 40 7 -20 39 7 -19 39 7 19
  [4,16,40,7,20,40,7,-20,39,7,-19,39,7,19],
// 4 16 -39 8 -19 -36 8 -16 36 8 -16 39 8 -19
  [4,16,-39,8,-19,-36,8,-16,36,8,-16,39,8,-19],
// 4 16 39 8 19 36 8 16 -36 8 16 -39 8 19
  [4,16,39,8,19,36,8,16,-36,8,16,-39,8,19],
// 4 16 -39 8 -19 -39 8 19 -36 8 16 -36 8 -16
  [4,16,-39,8,-19,-39,8,19,-36,8,16,-36,8,-16],
// 4 16 39 8 19 39 8 -19 36 8 -16 36 8 16
  [4,16,39,8,19,39,8,-19,36,8,-16,36,8,16],
// 1 16 0 4 0 1 0 0 0 -1 0 0 0 1 stud4.dat
  [1,16,0,4,0,1,0,0,0,-1,0,0,0,1, ldraw_lib__stud4()],
// 1 16 20 4 0 1 0 0 0 -1 0 0 0 1 stud4.dat
  [1,16,20,4,0,1,0,0,0,-1,0,0,0,1, ldraw_lib__stud4()],
// 1 16 -20 4 0 1 0 0 0 -1 0 0 0 1 stud4.dat
  [1,16,-20,4,0,1,0,0,0,-1,0,0,0,1, ldraw_lib__stud4()],
];
module ldraw_lib__s__87079s01(step=0, col=false, unit=2/5, alt=false, line=0.2, solid=!$preview)
    makepoly(ldraw_lib__s__87079s01(), step=step, col=col, unit=unit, alt=alt, line=line, solid=solid);
ldraw_lib__s__87079s01(line=0.2);
// main file
use <../lib.scad>
use <s/87079pb0s01.scad>
use <s/87079s01.scad>
function ldraw_lib__87079pb0() = [
// 0 Tile  2 x  4 with Yellow Batman Logo Oval Pattern
// 0 Name: 87079pb0.dat
// 0 Author: Takeshi Takahashi [RainbowDolphin]
// 0 !LDRAW_ORG Part UPDATE 2024-09
// 0 !LICENSE Licensed under CC BY 4.0 : see CAreadme.txt
// 
// 0 BFC CERTIFY CCW
  [0,"BFC","CERTIFY"],
  [0,"BFC","CCW"],
// 
// 0 !KEYWORDS 4+, Bricklink 87079pb0317, DC comics, Juniors
// 0 !KEYWORDS Rebrickable 87079pr0090, Set 10724, Set 10737, Set 10753
// 0 !KEYWORDS Super Heroes
// 
// 0 !HISTORY 2024-10-27 [OrionP] Official Update 2024-09
// 
// 
// 1 16 0 0 0 1 0 0 0 1 0 0 0 1 s\87079s01.dat
  [1,16,0,0,0,1,0,0,0,1,0,0,0,1, ldraw_lib__s__87079s01()],
// 1 16 0 0 0 1 0 0 0 1 0 0 0 1 s\87079pb0s01.dat
  [1,16,0,0,0,1,0,0,0,1,0,0,0,1, ldraw_lib__s__87079pb0s01()],
// 1 16 0 0 0 -1 0 0 0 1 0 0 0 1 s\87079pb0s01.dat
  [1,16,0,0,0,-1,0,0,0,1,0,0,0,1, ldraw_lib__s__87079pb0s01()],
// 3 16 -40 0 20 0 0 18 40 0 20
  [3,16,-40,0,20,0,0,18,40,0,20],
// 3 16 0 0 -18 -40 0 -20 40 0 -20
  [3,16,0,0,-18,-40,0,-20,40,0,-20],
];
module ldraw_lib__87079pb0(step=0, col=false, unit=2/5, alt=false, line=0.2, solid=!$preview)
    makepoly(ldraw_lib__87079pb0(), step=step, col=col, unit=unit, alt=alt, line=line, solid=solid);
ldraw_lib__87079pb0(line=0.2);
